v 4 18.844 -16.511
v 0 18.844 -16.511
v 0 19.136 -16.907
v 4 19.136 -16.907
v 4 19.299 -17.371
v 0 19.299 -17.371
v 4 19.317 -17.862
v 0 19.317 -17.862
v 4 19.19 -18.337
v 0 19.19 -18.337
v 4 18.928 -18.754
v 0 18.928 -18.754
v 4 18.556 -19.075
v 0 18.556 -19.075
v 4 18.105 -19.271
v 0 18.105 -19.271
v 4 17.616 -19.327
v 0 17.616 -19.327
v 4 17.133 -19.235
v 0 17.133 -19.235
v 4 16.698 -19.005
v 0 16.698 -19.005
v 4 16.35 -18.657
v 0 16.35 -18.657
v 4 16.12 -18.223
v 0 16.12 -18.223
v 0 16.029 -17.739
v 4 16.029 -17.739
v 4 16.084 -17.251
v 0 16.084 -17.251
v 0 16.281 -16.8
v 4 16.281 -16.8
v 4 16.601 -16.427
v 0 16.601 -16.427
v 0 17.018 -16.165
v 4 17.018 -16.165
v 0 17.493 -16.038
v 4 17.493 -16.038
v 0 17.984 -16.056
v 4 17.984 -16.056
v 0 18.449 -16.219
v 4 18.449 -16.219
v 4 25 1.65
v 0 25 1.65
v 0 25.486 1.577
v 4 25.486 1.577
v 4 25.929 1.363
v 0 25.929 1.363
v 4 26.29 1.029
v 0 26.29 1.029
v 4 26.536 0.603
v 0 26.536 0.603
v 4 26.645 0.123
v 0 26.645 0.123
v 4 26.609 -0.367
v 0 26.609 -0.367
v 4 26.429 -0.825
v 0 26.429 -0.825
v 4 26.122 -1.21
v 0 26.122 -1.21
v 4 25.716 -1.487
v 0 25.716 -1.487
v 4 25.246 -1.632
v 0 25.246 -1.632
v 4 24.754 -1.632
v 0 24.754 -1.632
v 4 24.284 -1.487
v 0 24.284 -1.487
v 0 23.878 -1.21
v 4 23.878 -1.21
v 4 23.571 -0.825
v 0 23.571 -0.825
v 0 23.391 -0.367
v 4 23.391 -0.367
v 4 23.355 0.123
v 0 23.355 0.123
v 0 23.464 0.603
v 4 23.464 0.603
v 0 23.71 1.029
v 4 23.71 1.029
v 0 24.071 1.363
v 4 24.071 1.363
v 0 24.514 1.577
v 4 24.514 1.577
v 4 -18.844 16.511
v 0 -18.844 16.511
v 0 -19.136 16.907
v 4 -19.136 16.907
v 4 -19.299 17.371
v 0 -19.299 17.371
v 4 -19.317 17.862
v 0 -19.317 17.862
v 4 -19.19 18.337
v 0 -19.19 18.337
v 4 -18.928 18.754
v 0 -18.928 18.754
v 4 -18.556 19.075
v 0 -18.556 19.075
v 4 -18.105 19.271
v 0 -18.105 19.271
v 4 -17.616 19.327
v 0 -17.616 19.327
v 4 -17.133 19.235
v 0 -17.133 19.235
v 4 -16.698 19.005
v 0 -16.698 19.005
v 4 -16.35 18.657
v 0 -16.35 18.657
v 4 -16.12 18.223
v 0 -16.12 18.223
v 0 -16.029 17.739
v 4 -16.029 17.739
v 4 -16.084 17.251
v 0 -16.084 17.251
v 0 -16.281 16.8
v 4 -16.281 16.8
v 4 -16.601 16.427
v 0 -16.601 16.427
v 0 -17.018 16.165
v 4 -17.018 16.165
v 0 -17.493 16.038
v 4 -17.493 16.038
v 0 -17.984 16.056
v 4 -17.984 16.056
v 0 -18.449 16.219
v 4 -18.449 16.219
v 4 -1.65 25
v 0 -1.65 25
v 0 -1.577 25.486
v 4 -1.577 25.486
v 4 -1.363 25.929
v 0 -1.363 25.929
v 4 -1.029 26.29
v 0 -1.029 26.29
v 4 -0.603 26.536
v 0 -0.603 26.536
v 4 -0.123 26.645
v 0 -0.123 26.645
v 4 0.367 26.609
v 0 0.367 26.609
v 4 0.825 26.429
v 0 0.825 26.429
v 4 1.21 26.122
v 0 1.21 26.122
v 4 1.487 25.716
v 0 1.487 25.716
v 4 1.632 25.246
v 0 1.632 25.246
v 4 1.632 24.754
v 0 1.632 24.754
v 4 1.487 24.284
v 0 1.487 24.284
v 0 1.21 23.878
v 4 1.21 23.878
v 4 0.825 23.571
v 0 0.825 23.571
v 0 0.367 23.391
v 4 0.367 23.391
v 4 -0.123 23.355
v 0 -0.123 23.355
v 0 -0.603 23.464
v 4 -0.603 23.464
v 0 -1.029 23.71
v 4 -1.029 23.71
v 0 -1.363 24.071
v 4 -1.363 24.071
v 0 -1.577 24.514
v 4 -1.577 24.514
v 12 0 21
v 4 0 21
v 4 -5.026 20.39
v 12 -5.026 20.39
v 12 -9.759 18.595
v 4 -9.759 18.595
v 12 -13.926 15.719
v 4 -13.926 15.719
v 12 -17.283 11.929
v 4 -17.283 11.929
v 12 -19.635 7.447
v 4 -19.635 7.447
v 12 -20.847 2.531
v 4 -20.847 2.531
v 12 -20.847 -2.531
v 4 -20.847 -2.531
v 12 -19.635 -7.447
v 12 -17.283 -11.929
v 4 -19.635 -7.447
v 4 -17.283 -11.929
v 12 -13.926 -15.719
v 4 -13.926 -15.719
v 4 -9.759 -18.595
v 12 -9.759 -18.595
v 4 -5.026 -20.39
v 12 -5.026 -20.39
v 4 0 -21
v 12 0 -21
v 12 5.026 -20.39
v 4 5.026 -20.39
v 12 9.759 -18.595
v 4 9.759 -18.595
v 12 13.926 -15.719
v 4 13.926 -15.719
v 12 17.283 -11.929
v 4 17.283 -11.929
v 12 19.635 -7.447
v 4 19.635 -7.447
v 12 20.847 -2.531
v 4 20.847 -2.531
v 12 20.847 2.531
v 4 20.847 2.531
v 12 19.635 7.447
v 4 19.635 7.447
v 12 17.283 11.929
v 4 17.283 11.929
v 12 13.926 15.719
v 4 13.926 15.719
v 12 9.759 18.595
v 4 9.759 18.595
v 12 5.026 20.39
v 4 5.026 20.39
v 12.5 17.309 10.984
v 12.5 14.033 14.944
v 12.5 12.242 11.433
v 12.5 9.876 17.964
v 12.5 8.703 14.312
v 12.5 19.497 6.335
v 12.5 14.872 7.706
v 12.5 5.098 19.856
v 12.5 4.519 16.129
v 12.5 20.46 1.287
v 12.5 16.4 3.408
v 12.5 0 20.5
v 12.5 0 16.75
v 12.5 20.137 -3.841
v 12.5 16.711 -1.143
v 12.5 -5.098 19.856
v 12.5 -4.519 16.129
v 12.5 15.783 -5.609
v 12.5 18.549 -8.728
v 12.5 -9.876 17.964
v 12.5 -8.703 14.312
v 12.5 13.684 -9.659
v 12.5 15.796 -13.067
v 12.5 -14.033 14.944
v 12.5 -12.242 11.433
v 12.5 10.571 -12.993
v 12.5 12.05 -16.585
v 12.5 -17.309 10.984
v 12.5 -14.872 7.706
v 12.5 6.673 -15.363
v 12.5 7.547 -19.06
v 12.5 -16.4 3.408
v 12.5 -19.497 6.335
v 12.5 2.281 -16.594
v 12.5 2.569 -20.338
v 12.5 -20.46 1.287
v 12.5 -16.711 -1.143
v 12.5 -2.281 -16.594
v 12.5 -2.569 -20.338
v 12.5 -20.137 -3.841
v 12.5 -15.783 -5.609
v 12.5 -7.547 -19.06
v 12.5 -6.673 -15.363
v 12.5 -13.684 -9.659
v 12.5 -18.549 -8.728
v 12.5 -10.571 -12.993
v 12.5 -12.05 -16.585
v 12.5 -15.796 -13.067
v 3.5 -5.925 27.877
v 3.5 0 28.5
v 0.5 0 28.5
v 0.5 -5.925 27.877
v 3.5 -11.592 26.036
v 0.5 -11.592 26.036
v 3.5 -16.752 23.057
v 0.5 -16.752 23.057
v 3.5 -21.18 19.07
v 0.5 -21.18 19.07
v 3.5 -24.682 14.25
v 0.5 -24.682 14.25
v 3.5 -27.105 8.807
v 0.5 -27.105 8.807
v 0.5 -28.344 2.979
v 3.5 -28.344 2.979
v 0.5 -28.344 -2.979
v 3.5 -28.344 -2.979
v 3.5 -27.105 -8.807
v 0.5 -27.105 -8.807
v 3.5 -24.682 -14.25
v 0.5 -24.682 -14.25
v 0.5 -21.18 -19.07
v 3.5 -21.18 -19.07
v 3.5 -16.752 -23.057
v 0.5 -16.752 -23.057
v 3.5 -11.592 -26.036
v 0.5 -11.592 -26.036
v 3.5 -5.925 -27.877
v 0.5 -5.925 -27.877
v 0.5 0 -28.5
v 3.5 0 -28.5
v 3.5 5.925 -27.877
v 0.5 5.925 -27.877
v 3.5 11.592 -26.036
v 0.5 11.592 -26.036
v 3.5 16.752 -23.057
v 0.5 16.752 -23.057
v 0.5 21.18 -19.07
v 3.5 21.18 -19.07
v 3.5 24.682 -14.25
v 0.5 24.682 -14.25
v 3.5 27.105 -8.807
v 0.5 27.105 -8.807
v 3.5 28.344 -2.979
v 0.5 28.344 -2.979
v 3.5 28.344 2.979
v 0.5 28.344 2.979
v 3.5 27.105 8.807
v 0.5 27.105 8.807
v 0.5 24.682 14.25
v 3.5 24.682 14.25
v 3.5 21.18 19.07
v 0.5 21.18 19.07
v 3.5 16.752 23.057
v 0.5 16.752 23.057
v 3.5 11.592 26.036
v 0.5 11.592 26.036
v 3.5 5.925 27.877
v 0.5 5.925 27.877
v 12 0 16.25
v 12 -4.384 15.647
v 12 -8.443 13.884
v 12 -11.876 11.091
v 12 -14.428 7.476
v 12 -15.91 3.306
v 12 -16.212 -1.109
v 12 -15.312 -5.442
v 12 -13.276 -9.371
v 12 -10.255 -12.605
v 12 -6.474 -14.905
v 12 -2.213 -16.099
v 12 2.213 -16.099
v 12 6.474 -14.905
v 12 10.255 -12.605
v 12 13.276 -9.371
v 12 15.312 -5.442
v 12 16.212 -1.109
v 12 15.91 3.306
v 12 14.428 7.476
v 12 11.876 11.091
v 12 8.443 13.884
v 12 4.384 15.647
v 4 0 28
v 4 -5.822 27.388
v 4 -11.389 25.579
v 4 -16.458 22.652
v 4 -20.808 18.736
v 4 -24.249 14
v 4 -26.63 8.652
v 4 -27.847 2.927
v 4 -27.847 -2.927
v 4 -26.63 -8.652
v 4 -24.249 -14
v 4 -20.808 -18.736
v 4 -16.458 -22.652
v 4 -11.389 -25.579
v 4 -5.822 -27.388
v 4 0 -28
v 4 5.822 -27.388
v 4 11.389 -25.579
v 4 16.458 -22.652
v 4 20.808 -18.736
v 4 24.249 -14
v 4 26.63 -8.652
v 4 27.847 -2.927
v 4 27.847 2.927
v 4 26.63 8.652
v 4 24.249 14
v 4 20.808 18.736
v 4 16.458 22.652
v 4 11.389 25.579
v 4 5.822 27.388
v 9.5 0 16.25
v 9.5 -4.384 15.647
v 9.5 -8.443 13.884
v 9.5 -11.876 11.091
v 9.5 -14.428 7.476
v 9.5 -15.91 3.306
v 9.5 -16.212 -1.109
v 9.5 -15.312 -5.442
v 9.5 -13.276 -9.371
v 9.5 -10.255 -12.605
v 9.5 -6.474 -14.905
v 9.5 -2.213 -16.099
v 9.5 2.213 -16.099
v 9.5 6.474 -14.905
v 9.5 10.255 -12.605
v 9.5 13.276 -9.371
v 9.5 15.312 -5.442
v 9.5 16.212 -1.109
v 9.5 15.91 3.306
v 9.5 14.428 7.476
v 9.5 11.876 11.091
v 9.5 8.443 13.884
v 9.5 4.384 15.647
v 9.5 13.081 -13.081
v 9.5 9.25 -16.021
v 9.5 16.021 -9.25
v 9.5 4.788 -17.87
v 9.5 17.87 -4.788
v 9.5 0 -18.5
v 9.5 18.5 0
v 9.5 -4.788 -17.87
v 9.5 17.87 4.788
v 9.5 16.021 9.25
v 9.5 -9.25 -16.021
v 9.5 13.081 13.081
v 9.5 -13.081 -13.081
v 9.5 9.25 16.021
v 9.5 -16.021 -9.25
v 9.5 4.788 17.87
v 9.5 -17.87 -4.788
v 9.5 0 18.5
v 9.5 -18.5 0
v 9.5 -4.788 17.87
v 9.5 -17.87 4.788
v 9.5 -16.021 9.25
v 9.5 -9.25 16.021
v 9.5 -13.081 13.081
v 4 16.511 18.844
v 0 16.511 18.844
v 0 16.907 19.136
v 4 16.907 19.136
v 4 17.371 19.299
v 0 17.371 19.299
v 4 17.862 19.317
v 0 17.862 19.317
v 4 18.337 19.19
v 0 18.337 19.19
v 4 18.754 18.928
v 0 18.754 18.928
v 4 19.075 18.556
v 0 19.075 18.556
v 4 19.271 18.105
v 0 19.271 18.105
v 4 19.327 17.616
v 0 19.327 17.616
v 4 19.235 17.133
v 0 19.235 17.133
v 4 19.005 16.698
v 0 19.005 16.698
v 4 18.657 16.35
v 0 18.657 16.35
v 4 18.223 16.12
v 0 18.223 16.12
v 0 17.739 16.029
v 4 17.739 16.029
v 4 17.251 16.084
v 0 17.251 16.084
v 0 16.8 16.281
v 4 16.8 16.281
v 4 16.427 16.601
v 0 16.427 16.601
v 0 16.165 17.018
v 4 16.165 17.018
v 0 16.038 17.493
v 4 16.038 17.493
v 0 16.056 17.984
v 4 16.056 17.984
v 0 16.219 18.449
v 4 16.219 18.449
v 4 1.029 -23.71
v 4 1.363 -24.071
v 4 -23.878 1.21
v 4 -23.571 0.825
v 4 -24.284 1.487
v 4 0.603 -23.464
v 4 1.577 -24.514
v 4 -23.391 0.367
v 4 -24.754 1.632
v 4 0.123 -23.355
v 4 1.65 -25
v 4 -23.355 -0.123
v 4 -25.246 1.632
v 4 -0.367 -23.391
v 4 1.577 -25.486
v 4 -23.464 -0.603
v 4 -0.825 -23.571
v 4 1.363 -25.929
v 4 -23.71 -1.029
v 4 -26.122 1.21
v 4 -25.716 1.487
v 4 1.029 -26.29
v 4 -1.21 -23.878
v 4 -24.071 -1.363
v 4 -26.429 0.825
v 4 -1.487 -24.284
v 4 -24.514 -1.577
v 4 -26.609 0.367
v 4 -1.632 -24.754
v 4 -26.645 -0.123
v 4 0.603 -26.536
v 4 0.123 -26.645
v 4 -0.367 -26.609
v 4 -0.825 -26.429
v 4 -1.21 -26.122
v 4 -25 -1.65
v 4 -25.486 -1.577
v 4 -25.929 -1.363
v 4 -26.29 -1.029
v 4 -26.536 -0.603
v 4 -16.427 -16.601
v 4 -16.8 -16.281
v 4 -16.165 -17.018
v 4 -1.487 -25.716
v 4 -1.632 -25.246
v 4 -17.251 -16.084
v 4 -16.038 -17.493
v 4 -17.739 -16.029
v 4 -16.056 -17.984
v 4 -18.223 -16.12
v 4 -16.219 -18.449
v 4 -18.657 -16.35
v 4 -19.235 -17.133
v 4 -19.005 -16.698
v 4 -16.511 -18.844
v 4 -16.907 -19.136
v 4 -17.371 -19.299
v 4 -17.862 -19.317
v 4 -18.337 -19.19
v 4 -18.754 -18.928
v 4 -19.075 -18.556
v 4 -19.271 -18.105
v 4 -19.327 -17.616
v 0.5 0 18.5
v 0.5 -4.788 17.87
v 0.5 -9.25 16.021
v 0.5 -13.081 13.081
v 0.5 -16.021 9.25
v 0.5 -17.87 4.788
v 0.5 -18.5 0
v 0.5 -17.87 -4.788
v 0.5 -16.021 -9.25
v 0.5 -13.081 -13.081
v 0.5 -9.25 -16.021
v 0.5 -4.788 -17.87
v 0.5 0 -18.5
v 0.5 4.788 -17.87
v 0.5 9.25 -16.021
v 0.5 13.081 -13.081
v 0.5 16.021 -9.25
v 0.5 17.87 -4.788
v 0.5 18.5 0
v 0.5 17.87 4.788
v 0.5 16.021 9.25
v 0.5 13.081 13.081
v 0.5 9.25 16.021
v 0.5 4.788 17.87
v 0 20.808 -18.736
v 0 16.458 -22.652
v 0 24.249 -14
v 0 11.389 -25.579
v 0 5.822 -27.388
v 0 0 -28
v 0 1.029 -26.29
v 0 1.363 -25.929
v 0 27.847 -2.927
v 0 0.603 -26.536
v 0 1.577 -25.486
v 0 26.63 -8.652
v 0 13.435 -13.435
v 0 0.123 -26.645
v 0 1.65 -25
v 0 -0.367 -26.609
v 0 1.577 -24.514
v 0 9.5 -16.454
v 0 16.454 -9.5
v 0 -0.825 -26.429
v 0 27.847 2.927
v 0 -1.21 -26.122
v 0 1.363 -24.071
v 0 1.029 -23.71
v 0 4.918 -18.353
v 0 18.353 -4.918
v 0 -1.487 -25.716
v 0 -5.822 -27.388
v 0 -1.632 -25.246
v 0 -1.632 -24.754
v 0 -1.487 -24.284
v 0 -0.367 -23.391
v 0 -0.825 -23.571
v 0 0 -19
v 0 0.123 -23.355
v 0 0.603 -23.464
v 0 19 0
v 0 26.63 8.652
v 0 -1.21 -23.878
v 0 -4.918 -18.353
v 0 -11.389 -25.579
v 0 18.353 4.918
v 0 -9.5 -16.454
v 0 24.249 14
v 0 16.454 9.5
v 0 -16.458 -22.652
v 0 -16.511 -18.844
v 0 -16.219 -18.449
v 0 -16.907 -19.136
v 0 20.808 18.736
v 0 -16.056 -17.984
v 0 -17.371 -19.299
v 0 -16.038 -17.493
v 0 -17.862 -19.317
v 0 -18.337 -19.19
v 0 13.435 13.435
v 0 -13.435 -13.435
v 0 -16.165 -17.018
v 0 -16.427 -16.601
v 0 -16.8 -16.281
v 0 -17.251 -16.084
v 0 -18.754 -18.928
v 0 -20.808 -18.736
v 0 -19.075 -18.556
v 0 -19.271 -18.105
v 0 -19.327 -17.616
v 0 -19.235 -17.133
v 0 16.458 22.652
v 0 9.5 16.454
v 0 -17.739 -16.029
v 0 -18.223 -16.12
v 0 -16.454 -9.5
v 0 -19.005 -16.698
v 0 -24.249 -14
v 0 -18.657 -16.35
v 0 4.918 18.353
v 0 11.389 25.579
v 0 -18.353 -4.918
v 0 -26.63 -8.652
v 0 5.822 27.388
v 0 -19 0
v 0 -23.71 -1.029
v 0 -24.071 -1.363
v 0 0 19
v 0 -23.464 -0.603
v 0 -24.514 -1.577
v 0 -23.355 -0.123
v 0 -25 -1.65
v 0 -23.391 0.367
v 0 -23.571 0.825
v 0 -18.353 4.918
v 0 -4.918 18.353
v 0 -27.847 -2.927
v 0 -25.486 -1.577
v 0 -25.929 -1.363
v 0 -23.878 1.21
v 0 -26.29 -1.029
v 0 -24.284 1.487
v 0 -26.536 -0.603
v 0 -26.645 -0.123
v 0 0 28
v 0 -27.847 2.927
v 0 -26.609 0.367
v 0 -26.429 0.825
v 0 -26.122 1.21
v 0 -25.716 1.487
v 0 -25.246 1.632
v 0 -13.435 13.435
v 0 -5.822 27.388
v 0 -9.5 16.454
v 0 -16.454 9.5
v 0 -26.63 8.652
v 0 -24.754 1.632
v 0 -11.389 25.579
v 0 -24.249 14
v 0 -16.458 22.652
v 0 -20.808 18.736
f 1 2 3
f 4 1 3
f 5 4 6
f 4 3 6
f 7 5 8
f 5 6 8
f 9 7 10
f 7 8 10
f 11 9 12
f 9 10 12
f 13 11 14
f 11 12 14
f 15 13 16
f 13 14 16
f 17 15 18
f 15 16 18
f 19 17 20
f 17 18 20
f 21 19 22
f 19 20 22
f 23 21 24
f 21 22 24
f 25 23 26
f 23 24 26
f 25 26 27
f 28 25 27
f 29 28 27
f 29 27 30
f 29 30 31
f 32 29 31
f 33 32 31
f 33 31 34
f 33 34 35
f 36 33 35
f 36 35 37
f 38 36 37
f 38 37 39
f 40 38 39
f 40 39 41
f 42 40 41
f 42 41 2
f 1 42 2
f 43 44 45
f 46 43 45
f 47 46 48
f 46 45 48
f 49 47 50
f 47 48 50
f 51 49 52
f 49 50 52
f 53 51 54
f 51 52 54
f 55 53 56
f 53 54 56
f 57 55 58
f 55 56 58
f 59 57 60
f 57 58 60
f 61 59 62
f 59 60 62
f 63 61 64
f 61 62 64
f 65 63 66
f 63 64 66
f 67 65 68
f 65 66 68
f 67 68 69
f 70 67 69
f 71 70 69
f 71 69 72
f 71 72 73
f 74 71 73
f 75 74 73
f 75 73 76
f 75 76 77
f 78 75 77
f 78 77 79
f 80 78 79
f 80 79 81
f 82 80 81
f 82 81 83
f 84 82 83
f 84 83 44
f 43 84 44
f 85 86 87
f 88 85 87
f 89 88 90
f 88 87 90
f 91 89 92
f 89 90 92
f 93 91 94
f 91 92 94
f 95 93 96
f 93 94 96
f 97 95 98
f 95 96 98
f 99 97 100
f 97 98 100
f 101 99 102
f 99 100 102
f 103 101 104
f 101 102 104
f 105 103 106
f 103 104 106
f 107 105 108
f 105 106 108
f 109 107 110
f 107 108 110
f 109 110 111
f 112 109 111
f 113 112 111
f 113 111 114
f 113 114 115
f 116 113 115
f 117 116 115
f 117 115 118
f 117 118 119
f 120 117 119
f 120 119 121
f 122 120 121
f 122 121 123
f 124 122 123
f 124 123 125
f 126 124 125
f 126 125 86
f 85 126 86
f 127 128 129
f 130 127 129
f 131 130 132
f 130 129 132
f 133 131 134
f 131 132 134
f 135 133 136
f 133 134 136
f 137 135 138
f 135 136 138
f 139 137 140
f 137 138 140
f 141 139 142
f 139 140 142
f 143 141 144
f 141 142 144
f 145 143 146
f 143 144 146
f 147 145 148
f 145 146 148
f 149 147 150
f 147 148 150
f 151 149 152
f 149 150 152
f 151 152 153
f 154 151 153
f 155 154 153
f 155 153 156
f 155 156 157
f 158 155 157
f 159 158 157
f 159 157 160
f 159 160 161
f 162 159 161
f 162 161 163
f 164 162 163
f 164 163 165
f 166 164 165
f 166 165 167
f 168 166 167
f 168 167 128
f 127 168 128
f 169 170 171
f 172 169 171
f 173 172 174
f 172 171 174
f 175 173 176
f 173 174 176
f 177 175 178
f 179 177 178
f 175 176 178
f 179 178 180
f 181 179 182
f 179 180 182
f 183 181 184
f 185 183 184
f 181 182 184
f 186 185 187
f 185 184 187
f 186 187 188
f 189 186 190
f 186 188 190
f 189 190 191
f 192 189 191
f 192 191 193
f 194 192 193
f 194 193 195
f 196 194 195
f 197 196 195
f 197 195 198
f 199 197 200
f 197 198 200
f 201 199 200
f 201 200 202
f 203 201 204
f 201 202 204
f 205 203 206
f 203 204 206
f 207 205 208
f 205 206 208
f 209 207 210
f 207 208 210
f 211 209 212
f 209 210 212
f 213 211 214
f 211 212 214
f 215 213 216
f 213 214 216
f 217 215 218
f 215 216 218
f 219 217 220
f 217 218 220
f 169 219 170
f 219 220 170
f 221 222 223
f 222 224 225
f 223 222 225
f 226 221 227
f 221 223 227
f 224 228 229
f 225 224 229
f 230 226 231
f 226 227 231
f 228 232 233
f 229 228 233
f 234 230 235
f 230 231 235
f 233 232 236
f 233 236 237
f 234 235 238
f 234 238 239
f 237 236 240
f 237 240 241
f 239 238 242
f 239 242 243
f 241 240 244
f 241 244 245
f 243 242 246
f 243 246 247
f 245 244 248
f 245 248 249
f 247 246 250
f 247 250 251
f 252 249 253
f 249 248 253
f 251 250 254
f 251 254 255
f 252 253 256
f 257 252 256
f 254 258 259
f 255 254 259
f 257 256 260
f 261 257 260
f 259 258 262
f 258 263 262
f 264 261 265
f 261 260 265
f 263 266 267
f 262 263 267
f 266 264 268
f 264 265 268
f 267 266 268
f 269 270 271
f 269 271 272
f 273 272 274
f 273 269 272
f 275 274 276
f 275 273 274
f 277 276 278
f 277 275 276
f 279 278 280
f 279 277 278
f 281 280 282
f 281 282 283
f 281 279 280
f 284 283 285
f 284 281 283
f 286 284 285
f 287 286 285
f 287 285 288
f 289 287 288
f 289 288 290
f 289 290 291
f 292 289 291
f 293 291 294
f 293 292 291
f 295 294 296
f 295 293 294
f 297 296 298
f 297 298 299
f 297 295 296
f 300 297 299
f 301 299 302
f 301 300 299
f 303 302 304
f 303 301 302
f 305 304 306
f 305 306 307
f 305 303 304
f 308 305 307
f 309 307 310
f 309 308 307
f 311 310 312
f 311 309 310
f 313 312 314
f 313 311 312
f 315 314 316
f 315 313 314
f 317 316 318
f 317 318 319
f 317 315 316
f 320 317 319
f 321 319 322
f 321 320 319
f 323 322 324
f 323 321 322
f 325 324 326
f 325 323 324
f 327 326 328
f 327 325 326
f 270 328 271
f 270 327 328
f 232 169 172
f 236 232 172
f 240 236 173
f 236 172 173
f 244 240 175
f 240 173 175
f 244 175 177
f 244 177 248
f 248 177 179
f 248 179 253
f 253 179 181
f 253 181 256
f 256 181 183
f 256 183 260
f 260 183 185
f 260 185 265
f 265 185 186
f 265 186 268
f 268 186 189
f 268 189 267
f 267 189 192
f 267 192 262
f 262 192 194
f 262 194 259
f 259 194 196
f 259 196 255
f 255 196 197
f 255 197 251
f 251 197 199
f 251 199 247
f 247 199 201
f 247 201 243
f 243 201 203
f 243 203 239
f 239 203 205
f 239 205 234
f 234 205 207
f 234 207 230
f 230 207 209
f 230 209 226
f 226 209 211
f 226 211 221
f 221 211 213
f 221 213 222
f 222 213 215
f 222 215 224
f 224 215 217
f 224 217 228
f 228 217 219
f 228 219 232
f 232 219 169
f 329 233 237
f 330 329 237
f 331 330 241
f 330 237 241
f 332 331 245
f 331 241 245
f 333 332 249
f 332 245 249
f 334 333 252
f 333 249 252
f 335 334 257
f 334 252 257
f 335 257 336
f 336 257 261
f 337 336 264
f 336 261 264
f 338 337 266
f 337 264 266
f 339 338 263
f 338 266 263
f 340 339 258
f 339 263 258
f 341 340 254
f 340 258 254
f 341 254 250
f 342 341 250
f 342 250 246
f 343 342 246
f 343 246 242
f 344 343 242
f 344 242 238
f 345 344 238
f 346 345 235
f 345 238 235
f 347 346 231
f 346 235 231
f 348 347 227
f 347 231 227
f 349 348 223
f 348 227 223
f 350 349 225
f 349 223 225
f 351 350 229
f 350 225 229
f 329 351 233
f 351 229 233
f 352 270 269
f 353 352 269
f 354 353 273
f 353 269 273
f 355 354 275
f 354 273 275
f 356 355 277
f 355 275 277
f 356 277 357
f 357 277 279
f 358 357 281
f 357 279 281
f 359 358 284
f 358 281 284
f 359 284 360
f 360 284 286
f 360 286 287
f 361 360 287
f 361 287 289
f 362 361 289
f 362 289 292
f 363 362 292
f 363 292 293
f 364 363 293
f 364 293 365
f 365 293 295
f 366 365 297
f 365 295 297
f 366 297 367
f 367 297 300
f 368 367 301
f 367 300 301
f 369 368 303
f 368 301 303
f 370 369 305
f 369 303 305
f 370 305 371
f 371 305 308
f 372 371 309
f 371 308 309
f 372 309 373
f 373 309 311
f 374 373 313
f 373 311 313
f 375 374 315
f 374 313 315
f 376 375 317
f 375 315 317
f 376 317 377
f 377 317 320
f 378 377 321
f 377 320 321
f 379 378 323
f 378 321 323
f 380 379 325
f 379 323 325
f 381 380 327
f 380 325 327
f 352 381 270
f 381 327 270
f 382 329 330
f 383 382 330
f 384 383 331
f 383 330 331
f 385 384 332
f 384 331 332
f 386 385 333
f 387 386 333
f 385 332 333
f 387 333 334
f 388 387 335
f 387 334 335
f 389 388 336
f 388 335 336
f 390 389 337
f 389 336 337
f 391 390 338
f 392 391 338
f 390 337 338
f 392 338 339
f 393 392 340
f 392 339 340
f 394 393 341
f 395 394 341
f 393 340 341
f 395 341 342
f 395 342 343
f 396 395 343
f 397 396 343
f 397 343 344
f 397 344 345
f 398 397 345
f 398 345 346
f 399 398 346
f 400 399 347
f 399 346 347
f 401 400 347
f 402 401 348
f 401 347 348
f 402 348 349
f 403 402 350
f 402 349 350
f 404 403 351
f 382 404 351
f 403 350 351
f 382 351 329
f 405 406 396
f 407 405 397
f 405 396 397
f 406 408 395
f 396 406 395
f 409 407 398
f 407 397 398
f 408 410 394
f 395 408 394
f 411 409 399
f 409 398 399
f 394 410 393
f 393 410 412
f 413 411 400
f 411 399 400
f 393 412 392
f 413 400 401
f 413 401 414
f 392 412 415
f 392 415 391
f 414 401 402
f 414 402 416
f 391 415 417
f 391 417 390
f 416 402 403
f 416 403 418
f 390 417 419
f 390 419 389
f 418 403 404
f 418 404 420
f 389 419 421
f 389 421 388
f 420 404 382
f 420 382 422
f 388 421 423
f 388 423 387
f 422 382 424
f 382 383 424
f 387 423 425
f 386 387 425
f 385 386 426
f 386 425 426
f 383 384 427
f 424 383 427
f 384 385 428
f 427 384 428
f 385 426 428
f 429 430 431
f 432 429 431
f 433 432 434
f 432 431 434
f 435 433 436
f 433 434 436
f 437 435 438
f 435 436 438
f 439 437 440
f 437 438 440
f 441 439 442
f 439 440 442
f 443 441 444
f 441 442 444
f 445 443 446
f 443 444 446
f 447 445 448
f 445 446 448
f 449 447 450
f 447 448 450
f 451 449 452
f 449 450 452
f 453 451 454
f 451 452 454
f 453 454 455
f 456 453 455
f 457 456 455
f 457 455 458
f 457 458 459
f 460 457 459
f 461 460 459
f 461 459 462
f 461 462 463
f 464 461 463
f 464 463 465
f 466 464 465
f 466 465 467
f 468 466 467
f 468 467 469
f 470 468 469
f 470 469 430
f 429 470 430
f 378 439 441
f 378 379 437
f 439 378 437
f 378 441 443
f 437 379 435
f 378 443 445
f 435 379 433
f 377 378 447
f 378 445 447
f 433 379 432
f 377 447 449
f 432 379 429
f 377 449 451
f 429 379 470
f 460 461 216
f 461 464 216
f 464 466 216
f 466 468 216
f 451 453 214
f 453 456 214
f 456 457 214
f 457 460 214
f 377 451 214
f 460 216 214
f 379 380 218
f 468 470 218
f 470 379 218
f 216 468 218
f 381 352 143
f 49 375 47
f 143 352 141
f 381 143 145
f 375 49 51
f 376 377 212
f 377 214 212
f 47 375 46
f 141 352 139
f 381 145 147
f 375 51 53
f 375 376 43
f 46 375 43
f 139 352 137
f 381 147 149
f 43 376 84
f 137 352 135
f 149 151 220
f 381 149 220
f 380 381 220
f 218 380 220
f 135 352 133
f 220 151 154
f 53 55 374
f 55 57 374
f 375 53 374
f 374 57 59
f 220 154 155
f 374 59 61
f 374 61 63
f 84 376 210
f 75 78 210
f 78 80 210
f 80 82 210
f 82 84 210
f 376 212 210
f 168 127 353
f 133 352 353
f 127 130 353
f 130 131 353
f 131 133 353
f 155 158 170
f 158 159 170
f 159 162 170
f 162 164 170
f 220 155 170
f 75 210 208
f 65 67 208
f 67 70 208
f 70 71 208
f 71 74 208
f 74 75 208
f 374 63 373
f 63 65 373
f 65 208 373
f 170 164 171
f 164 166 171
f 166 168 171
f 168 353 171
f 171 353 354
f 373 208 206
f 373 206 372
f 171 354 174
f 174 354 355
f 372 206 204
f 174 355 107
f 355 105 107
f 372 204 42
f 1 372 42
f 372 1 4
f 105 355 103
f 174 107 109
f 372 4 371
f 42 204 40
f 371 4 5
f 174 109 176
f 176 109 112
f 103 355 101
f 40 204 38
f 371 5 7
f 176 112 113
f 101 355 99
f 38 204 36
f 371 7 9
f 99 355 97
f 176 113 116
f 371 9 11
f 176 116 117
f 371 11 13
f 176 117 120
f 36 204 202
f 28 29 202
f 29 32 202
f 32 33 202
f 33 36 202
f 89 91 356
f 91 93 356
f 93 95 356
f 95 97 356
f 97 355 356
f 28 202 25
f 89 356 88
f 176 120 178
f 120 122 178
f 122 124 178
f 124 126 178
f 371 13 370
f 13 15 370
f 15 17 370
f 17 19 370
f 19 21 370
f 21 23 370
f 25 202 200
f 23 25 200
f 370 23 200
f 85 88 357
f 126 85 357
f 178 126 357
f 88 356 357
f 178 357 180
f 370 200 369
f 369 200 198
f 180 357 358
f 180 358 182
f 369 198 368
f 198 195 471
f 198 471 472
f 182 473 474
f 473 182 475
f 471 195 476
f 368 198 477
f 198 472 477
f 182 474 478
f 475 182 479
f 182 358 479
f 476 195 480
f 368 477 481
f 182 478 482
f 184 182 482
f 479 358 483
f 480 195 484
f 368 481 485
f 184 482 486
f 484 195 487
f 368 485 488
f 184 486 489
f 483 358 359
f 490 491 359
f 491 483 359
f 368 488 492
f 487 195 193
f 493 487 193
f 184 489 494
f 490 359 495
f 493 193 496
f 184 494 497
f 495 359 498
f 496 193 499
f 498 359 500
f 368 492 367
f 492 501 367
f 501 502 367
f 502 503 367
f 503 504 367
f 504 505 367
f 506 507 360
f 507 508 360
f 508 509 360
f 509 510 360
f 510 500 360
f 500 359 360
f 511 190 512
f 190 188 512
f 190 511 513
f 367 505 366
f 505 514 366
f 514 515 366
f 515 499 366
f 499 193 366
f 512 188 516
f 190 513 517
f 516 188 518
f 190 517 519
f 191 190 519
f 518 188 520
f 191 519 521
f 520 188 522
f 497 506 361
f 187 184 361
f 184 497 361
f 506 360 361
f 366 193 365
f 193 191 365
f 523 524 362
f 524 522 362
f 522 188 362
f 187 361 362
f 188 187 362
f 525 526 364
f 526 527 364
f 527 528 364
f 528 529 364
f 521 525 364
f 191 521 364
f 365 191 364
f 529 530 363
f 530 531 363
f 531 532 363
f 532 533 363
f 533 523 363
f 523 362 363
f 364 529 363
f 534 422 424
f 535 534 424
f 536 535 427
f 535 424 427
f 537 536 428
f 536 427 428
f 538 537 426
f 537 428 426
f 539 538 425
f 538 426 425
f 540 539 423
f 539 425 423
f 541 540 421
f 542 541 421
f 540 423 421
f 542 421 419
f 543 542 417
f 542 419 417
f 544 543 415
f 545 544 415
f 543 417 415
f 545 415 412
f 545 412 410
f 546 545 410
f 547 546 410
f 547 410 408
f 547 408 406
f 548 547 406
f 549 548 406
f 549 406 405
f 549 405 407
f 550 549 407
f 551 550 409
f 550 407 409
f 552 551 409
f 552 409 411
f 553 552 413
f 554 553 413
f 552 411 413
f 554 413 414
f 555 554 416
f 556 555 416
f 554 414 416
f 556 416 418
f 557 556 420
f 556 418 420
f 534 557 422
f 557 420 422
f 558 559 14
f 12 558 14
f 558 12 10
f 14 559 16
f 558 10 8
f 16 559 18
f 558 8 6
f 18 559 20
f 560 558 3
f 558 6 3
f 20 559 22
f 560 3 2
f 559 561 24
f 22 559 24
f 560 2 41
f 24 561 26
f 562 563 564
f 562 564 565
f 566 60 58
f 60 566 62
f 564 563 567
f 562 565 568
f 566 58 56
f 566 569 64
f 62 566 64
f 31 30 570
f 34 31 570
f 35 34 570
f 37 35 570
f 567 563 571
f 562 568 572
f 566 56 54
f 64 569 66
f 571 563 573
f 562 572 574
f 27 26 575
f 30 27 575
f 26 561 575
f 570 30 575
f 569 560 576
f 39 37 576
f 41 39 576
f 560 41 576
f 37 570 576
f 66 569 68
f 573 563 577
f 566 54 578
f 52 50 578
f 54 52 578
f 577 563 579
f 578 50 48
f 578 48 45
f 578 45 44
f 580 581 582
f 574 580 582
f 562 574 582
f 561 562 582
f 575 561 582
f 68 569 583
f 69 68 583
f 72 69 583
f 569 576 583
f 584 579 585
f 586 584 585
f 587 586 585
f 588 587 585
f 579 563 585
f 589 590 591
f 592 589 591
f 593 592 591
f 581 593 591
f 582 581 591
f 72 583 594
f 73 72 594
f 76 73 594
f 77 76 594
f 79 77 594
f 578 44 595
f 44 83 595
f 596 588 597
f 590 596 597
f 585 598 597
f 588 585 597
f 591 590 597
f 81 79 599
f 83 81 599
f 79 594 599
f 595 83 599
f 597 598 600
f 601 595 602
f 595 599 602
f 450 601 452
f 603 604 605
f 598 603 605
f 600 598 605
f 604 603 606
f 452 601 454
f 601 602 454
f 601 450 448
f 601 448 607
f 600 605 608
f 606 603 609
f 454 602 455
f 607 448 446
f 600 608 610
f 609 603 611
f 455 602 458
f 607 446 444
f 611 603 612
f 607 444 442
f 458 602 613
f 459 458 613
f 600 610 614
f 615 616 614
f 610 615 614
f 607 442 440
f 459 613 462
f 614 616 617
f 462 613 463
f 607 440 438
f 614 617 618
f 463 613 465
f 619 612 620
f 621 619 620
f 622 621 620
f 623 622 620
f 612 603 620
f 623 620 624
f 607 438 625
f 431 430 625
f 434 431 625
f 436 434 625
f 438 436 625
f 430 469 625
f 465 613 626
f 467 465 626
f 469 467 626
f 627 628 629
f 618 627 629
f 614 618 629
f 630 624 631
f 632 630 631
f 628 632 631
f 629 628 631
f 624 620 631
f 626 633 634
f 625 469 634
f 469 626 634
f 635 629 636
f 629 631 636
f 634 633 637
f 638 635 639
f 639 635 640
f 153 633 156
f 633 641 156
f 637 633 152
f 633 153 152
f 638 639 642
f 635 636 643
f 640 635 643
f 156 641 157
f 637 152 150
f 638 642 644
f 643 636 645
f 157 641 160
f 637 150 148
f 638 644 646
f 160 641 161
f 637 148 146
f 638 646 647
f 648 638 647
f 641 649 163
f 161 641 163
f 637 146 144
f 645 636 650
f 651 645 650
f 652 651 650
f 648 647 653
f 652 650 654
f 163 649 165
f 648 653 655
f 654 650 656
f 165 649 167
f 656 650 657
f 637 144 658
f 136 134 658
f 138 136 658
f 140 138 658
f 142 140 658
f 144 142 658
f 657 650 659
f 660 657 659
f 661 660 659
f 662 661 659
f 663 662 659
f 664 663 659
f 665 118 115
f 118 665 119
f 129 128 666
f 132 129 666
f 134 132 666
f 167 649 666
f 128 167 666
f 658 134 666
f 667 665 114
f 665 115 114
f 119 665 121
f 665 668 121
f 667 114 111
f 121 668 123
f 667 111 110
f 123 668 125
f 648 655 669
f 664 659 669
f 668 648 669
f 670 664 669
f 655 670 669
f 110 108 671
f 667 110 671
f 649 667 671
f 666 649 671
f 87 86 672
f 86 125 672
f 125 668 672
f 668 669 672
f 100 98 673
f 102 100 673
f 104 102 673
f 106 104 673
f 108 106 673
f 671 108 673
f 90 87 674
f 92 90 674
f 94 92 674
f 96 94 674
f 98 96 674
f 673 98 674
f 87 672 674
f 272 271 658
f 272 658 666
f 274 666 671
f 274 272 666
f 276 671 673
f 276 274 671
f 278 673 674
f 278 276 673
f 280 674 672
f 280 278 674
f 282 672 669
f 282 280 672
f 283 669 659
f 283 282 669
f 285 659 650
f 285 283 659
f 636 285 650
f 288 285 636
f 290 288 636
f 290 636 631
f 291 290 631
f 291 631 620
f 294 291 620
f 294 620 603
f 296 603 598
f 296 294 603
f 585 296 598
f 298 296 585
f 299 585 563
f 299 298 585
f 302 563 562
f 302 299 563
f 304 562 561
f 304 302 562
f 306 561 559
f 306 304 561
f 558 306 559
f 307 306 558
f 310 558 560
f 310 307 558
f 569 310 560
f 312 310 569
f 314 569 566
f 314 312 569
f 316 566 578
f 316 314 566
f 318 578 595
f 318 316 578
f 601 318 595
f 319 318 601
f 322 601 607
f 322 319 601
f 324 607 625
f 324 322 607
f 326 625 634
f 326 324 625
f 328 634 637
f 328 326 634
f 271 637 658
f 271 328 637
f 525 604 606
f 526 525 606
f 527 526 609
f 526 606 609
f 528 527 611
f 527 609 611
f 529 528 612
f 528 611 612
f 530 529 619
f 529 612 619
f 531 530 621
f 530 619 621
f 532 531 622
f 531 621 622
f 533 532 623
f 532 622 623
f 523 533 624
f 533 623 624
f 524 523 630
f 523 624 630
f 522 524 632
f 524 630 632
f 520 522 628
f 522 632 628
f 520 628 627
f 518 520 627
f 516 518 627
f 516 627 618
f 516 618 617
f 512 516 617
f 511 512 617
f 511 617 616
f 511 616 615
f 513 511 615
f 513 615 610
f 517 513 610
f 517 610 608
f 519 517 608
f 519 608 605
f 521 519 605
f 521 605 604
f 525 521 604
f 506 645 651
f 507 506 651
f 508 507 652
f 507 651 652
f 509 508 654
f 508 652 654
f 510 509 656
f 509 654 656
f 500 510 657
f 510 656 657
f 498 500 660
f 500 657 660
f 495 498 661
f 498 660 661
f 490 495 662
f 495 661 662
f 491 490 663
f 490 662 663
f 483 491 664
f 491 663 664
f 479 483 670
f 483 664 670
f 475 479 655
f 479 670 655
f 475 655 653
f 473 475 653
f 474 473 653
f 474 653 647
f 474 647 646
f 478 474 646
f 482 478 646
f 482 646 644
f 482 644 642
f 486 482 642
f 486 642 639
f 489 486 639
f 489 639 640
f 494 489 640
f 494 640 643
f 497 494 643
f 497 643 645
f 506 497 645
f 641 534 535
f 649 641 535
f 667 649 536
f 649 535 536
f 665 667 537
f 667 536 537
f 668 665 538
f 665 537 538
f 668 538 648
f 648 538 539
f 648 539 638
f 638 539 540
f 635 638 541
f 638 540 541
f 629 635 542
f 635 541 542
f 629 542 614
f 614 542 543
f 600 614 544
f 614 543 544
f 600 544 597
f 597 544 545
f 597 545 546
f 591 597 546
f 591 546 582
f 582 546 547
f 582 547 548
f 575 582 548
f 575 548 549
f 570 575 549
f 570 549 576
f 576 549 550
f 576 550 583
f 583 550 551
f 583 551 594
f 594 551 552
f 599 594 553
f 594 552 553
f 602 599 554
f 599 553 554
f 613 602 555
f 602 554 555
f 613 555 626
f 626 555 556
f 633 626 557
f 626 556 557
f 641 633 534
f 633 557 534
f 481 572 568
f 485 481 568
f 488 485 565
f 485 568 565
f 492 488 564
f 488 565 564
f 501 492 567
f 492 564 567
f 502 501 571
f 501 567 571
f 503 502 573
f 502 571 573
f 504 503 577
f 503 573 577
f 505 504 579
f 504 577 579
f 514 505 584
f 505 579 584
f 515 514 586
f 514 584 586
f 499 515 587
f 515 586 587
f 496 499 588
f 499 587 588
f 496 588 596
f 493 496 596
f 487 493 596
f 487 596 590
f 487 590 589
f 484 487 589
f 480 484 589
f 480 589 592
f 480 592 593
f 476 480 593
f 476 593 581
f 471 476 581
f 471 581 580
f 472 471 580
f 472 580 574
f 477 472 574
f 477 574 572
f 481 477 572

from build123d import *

# Parameters (mm, degrees)
SKETCH_1_W               = 4
SKETCH_1_H               = 7.5
CHAMFER_1_SIZE           = 0.5
HOLE_WIZARD_M4_1_D       = 3.3
PATTERN_CIRCULAR_1_COUNT = 8


with BuildPart() as part:
    # 草图1 → 旋转1 (revolve)
    with BuildSketch(Plane.XY, mode=Mode.PRIVATE) as revolve_1_sk:
        with Locations((2, 24.75)):
            Rectangle(SKETCH_1_W, SKETCH_1_H)
        Polygon((4, 21), (0, 21), (0, 18.5), (9.5, 18.5), (9.5, 21), align=None)
        Polygon((12.5, 21), (9.5, 21), (9.5, 18.5), (9.5, 16.25), (12.5, 16.25), align=None)
    revolve(revolve_1_sk.sketch.rotate(Axis((0, 0, 0), (1, 0, 0)), 90), axis=Axis((0, 0, 0), (1, 0, 0)))

    # 倒角1
    chamfer_1_edges = [part.edges().sort_by_distance(p)[0] for p in [
        (0, 0, -18.5),
        (0, 0, -28.5),
        (4, 0, -28.5),
        (12.5, 0, -16.25),
        (12.5, 0, -21),
    ]]
    chamfer(chamfer_1_edges, length=CHAMFER_1_SIZE)

    # M4 螺纹孔1 (through all)
    with Locations(Plane(origin=(4, 0, 0), x_dir=(0, 0, -1), z_dir=(1, 0, 0))):
        with Locations((0, 25)):
            hole_wizard_m4_1 = Hole(HOLE_WIZARD_M4_1_D / 2)

    # 阵列(圆周)1: M4 螺纹孔1 ×8 about axis
    pattern_circular_1_axis = Axis((0, 0, 0), (1, 0, 0))
    for i in range(1, PATTERN_CIRCULAR_1_COUNT):
        add(hole_wizard_m4_1.rotate(pattern_circular_1_axis, i * 360 / PATTERN_CIRCULAR_1_COUNT), mode=Mode.SUBTRACT)


solid = part.part
